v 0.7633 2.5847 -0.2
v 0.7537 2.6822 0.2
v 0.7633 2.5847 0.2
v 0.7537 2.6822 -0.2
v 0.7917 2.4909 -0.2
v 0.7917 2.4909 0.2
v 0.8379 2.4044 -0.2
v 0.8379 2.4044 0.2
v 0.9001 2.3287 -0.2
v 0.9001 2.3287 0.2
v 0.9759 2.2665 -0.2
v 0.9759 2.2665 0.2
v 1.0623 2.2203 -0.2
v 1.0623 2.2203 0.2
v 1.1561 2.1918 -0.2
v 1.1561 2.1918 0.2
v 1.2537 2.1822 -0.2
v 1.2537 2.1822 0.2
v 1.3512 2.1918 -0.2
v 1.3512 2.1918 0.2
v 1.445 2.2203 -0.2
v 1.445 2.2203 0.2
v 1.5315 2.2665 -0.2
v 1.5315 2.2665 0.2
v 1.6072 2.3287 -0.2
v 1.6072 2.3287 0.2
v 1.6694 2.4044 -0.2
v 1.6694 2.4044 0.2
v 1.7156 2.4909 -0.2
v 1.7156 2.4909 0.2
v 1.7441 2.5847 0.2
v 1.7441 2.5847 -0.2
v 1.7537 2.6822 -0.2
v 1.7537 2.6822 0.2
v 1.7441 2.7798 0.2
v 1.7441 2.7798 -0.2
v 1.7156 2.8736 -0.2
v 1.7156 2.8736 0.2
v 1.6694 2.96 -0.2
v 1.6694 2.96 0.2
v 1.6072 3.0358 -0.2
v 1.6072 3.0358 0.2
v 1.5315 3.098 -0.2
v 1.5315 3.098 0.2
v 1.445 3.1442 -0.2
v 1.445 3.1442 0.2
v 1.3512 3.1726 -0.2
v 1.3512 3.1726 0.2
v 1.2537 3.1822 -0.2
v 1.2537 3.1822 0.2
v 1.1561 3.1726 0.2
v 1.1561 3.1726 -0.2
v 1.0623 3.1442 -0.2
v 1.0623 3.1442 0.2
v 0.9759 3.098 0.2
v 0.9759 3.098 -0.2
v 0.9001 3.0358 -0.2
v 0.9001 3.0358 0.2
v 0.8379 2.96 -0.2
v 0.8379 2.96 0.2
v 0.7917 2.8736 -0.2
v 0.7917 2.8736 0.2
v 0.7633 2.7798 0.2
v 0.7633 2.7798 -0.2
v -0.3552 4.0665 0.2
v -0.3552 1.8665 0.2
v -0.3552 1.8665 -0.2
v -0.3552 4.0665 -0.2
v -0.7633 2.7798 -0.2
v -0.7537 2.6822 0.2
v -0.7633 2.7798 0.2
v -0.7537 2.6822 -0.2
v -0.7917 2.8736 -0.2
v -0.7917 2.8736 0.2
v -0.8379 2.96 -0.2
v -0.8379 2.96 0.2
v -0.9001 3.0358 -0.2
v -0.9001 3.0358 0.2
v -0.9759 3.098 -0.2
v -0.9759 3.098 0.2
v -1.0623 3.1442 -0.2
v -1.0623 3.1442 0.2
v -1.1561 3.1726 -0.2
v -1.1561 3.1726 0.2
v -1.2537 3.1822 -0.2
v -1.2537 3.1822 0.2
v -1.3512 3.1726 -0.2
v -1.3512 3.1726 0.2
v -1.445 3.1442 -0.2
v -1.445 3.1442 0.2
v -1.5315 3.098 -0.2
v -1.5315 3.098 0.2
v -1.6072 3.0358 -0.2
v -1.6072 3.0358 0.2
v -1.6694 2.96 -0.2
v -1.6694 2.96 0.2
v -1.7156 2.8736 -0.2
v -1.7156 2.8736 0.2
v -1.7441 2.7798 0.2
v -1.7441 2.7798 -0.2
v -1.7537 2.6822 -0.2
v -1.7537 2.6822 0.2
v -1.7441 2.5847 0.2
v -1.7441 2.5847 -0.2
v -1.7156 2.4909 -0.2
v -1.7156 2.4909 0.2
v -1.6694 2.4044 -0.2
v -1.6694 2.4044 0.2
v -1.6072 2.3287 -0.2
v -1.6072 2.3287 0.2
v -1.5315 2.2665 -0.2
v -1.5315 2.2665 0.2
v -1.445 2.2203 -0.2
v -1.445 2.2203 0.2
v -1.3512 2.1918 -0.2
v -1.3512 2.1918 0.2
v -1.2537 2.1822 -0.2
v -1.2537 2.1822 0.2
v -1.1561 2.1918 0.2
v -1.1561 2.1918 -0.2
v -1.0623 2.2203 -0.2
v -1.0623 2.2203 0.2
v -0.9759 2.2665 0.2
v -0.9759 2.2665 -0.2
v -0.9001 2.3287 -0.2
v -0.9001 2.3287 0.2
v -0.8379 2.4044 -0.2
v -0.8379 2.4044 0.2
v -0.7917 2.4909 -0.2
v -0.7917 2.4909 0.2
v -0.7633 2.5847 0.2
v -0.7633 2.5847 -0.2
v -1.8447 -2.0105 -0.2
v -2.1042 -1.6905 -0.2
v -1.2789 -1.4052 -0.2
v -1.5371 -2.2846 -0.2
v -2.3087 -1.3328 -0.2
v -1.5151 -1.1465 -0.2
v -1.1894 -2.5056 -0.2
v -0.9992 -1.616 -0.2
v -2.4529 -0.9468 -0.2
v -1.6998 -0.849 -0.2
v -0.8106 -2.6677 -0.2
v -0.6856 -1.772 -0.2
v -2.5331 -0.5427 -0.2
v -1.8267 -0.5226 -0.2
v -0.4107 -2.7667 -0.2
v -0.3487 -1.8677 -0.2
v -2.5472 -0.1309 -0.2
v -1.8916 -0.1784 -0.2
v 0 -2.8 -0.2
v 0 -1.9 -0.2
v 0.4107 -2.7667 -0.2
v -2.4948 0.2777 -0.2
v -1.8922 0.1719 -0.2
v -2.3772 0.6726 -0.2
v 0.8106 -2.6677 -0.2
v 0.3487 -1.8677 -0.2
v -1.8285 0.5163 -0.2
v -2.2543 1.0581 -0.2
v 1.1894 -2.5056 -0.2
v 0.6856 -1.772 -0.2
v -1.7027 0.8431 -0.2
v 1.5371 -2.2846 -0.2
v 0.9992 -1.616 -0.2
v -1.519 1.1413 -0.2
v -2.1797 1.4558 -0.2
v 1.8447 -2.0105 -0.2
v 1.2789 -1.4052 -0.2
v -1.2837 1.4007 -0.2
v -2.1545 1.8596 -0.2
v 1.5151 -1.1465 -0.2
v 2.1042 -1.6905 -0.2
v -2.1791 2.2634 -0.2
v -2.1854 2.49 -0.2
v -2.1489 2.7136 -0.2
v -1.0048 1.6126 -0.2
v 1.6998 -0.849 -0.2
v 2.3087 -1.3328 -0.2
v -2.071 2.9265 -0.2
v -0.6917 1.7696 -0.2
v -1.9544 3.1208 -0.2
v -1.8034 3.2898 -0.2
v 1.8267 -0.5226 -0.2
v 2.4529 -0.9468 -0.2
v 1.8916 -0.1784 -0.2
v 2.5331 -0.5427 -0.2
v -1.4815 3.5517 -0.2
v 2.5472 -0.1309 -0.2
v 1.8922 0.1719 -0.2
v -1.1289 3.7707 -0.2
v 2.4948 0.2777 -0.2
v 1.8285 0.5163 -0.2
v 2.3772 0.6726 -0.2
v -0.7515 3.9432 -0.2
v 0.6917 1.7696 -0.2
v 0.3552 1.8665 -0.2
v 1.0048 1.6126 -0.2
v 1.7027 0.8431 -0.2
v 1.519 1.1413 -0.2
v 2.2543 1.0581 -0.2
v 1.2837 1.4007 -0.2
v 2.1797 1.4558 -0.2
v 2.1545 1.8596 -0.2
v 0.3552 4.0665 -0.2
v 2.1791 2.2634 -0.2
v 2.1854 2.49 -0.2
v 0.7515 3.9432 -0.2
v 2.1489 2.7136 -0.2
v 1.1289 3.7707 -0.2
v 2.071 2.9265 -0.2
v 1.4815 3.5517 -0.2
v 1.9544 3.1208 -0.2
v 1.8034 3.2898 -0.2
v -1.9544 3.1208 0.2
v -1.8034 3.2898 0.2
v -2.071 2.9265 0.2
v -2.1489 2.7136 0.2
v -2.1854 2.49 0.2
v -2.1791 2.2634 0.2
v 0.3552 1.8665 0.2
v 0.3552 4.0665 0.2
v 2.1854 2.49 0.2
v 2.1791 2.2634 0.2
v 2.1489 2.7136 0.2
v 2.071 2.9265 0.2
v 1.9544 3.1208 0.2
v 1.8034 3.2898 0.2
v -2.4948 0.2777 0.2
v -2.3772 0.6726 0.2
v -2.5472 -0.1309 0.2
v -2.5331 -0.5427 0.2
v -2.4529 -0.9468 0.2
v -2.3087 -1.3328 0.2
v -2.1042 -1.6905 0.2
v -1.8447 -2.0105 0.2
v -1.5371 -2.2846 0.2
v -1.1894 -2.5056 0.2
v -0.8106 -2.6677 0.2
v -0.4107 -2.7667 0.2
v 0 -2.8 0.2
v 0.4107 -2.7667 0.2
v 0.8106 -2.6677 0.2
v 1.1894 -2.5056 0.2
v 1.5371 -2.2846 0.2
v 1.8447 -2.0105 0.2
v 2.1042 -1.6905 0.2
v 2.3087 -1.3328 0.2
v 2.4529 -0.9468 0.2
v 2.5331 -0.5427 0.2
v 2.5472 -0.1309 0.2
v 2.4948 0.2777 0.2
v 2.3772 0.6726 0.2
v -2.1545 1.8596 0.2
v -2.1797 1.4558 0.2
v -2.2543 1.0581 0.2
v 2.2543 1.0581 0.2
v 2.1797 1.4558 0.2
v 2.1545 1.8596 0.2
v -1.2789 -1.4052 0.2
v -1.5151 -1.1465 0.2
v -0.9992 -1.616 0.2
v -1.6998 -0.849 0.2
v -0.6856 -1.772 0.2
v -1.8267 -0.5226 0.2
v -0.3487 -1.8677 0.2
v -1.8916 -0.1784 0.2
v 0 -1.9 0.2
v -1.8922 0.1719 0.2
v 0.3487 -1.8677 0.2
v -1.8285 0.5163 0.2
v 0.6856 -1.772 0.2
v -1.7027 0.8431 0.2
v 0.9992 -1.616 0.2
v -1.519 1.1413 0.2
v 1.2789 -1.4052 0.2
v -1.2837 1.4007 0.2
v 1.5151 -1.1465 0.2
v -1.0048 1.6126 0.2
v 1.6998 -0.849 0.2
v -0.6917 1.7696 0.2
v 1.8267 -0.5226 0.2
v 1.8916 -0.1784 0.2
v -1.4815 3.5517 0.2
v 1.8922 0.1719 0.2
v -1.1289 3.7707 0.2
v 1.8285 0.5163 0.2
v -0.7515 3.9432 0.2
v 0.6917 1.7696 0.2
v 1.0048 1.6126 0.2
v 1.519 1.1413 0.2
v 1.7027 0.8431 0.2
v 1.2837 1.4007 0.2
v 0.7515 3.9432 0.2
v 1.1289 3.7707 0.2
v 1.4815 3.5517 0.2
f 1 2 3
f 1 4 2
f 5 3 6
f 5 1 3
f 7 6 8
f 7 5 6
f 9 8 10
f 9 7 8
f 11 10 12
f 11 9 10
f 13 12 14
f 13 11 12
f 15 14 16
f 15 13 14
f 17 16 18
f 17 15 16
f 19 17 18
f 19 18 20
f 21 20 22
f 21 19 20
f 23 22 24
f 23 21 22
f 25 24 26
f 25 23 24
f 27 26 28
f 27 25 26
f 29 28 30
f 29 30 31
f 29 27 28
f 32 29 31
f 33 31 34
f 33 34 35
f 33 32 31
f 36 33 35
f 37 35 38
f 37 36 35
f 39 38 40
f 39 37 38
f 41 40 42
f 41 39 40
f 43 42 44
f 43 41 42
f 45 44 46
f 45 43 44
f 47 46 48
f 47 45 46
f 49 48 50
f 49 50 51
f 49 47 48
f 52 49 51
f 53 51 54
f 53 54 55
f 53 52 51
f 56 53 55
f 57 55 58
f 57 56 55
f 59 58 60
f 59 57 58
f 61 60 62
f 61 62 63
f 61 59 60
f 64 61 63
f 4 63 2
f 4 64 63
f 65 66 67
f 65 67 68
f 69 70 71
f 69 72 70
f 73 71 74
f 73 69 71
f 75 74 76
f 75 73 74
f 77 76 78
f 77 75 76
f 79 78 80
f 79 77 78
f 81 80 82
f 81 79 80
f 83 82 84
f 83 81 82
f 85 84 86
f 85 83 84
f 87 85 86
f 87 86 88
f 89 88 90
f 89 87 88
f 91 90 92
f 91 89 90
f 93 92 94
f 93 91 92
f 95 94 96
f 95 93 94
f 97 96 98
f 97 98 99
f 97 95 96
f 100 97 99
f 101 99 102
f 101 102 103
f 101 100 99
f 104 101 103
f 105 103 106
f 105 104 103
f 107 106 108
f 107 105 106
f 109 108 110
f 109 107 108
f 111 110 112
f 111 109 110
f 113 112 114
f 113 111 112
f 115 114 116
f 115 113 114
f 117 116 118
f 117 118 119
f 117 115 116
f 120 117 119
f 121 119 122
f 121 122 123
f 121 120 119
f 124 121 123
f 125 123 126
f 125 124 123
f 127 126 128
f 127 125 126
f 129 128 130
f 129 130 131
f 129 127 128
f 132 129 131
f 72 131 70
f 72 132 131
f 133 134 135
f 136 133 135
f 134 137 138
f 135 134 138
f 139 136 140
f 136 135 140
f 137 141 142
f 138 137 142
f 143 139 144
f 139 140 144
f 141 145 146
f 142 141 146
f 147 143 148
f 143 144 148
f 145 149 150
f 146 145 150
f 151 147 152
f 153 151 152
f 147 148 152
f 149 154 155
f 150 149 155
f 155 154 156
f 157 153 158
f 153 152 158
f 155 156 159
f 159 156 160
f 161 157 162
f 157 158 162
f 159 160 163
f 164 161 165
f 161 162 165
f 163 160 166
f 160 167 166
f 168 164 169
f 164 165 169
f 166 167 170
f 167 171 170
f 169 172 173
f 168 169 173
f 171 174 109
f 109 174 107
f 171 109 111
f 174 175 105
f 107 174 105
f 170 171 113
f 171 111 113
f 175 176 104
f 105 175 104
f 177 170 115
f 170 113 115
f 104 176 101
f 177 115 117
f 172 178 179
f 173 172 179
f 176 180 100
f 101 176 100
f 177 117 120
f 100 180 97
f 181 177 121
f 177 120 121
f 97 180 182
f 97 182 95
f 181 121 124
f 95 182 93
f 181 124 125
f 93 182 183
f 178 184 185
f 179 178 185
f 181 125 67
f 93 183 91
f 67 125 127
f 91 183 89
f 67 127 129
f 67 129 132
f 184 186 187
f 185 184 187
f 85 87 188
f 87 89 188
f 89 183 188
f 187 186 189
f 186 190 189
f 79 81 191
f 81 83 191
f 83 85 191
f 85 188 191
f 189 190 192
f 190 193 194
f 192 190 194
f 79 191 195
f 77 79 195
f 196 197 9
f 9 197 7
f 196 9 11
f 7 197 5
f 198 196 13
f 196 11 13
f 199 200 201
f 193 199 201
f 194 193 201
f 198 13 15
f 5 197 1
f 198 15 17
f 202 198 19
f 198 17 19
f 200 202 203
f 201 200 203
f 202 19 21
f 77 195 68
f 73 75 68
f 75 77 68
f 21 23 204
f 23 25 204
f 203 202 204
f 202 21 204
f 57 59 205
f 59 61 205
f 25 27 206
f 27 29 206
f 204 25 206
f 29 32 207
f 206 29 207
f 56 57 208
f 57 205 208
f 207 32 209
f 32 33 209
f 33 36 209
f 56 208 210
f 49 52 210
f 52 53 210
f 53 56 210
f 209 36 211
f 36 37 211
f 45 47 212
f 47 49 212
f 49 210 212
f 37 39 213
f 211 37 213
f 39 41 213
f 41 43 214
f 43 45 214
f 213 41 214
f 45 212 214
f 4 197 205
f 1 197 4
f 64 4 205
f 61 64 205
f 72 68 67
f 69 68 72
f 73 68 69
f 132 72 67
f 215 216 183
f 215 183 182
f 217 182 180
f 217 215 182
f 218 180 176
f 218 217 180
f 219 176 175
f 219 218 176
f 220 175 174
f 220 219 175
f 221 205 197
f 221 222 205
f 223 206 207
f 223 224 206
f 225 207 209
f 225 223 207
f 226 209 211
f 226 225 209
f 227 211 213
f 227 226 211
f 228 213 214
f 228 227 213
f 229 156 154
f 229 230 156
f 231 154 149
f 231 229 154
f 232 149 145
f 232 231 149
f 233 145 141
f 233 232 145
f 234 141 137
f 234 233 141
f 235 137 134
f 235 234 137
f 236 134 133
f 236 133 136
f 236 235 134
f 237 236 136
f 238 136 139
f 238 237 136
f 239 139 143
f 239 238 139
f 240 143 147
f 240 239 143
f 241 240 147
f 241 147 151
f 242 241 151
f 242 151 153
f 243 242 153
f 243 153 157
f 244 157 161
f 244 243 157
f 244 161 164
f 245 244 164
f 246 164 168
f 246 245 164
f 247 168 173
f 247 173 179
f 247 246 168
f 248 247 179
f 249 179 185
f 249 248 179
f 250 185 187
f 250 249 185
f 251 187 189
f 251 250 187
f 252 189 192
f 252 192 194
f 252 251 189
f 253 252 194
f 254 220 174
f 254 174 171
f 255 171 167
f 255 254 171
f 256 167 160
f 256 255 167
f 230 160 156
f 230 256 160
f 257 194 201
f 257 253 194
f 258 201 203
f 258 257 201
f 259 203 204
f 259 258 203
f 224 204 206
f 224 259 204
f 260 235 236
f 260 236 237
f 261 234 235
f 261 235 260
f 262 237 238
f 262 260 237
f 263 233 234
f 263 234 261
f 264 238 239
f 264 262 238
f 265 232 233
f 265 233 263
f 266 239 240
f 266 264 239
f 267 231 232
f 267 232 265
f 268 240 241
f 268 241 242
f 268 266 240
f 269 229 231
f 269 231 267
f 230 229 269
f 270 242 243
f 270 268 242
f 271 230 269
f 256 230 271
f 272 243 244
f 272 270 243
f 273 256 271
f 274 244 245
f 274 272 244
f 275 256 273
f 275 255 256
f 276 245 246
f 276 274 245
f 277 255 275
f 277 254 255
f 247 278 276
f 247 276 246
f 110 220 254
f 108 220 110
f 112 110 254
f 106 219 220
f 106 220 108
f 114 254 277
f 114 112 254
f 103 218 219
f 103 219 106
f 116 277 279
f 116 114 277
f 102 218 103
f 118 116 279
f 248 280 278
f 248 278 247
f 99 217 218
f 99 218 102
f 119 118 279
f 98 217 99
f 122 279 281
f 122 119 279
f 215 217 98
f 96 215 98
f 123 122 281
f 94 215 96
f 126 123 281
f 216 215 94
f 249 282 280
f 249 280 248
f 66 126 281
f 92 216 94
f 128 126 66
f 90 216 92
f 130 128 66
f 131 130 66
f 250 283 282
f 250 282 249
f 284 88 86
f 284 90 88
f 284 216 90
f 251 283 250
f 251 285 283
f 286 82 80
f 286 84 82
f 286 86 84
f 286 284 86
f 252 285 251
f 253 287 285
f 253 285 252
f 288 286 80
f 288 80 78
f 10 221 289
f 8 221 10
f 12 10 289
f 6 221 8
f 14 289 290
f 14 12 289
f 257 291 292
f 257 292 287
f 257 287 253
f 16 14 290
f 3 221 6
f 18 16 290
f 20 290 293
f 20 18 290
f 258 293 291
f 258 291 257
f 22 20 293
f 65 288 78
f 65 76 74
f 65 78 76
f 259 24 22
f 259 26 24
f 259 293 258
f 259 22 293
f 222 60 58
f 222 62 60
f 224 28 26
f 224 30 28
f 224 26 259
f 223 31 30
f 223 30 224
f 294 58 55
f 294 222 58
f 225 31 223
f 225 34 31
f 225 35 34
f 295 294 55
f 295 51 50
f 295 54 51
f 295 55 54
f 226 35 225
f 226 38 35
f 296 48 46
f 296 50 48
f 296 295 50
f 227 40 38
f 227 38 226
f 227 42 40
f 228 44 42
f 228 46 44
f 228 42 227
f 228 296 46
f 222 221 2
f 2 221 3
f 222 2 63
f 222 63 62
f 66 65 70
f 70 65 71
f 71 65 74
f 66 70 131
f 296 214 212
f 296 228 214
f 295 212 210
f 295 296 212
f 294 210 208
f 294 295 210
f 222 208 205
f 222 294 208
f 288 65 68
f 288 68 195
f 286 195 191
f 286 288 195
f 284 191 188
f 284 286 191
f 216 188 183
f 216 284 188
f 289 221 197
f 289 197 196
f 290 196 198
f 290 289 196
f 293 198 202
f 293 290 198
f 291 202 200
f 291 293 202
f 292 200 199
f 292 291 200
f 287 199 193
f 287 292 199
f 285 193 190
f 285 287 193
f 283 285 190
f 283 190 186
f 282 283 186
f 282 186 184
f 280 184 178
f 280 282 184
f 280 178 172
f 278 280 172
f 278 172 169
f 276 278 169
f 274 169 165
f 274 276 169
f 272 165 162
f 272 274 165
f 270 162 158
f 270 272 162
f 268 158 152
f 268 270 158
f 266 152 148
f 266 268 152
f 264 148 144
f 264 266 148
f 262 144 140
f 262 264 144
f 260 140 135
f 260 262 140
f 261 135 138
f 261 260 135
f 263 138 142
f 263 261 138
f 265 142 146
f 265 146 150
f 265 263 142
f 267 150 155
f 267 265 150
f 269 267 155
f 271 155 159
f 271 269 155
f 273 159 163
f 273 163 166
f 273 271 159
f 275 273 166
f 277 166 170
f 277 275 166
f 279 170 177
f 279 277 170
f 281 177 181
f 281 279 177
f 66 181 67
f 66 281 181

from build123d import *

# Parameters (mm, degrees)
SKETCH1_R           = 0.5
BOSS_EXTRUDE1_DEPTH = 0.2


with BuildPart() as part:
    # Sketch1 → Boss-Extrude1 (new, symmetric)
    with BuildSketch(Plane.XY):
        with BuildLine():
            Line((0.355177163, 4.066507215), (0.355177163, 1.866507215))
            ThreePointArc((0.355177163, 1.866507215), (0, -1.9), (-0.355177163, 1.866507215))
            Line((-0.355177163, 1.866507215), (-0.355177163, 4.066507215))
            ThreePointArc((-0.355177163, 4.066507215), (-1.128937663, 3.770726054), (-1.80338405, 3.289775039))
            ThreePointArc((-1.80338405, 3.289775039), (-2.114987451, 2.821889427), (-2.179084676, 2.263404717))
            ThreePointArc((-2.179084676, 2.263404717), (-2.179717367, 1.455750813), (-2.377239579, 0.67262234))
            ThreePointArc((-2.377239579, 0.67262234), (0, -2.8), (2.377239579, 0.67262234))
            ThreePointArc((2.377239579, 0.67262234), (2.179717367, 1.455750813), (2.179084676, 2.263404717))
            ThreePointArc((2.179084676, 2.263404717), (2.114987451, 2.821889427), (1.80338405, 3.289775039))
            ThreePointArc((1.80338405, 3.289775039), (1.128937663, 3.770726054), (0.355177163, 4.066507215))
        make_face()
        with Locations((-1.253673205, 2.682219999)):
            Circle(SKETCH1_R, mode=Mode.SUBTRACT)
        with Locations(Location((1.253673205, 2.682219999, 0), (0, 0, 180))):
            Circle(SKETCH1_R, mode=Mode.SUBTRACT)
    extrude(amount=BOSS_EXTRUDE1_DEPTH, both=True)


solid = part.part
